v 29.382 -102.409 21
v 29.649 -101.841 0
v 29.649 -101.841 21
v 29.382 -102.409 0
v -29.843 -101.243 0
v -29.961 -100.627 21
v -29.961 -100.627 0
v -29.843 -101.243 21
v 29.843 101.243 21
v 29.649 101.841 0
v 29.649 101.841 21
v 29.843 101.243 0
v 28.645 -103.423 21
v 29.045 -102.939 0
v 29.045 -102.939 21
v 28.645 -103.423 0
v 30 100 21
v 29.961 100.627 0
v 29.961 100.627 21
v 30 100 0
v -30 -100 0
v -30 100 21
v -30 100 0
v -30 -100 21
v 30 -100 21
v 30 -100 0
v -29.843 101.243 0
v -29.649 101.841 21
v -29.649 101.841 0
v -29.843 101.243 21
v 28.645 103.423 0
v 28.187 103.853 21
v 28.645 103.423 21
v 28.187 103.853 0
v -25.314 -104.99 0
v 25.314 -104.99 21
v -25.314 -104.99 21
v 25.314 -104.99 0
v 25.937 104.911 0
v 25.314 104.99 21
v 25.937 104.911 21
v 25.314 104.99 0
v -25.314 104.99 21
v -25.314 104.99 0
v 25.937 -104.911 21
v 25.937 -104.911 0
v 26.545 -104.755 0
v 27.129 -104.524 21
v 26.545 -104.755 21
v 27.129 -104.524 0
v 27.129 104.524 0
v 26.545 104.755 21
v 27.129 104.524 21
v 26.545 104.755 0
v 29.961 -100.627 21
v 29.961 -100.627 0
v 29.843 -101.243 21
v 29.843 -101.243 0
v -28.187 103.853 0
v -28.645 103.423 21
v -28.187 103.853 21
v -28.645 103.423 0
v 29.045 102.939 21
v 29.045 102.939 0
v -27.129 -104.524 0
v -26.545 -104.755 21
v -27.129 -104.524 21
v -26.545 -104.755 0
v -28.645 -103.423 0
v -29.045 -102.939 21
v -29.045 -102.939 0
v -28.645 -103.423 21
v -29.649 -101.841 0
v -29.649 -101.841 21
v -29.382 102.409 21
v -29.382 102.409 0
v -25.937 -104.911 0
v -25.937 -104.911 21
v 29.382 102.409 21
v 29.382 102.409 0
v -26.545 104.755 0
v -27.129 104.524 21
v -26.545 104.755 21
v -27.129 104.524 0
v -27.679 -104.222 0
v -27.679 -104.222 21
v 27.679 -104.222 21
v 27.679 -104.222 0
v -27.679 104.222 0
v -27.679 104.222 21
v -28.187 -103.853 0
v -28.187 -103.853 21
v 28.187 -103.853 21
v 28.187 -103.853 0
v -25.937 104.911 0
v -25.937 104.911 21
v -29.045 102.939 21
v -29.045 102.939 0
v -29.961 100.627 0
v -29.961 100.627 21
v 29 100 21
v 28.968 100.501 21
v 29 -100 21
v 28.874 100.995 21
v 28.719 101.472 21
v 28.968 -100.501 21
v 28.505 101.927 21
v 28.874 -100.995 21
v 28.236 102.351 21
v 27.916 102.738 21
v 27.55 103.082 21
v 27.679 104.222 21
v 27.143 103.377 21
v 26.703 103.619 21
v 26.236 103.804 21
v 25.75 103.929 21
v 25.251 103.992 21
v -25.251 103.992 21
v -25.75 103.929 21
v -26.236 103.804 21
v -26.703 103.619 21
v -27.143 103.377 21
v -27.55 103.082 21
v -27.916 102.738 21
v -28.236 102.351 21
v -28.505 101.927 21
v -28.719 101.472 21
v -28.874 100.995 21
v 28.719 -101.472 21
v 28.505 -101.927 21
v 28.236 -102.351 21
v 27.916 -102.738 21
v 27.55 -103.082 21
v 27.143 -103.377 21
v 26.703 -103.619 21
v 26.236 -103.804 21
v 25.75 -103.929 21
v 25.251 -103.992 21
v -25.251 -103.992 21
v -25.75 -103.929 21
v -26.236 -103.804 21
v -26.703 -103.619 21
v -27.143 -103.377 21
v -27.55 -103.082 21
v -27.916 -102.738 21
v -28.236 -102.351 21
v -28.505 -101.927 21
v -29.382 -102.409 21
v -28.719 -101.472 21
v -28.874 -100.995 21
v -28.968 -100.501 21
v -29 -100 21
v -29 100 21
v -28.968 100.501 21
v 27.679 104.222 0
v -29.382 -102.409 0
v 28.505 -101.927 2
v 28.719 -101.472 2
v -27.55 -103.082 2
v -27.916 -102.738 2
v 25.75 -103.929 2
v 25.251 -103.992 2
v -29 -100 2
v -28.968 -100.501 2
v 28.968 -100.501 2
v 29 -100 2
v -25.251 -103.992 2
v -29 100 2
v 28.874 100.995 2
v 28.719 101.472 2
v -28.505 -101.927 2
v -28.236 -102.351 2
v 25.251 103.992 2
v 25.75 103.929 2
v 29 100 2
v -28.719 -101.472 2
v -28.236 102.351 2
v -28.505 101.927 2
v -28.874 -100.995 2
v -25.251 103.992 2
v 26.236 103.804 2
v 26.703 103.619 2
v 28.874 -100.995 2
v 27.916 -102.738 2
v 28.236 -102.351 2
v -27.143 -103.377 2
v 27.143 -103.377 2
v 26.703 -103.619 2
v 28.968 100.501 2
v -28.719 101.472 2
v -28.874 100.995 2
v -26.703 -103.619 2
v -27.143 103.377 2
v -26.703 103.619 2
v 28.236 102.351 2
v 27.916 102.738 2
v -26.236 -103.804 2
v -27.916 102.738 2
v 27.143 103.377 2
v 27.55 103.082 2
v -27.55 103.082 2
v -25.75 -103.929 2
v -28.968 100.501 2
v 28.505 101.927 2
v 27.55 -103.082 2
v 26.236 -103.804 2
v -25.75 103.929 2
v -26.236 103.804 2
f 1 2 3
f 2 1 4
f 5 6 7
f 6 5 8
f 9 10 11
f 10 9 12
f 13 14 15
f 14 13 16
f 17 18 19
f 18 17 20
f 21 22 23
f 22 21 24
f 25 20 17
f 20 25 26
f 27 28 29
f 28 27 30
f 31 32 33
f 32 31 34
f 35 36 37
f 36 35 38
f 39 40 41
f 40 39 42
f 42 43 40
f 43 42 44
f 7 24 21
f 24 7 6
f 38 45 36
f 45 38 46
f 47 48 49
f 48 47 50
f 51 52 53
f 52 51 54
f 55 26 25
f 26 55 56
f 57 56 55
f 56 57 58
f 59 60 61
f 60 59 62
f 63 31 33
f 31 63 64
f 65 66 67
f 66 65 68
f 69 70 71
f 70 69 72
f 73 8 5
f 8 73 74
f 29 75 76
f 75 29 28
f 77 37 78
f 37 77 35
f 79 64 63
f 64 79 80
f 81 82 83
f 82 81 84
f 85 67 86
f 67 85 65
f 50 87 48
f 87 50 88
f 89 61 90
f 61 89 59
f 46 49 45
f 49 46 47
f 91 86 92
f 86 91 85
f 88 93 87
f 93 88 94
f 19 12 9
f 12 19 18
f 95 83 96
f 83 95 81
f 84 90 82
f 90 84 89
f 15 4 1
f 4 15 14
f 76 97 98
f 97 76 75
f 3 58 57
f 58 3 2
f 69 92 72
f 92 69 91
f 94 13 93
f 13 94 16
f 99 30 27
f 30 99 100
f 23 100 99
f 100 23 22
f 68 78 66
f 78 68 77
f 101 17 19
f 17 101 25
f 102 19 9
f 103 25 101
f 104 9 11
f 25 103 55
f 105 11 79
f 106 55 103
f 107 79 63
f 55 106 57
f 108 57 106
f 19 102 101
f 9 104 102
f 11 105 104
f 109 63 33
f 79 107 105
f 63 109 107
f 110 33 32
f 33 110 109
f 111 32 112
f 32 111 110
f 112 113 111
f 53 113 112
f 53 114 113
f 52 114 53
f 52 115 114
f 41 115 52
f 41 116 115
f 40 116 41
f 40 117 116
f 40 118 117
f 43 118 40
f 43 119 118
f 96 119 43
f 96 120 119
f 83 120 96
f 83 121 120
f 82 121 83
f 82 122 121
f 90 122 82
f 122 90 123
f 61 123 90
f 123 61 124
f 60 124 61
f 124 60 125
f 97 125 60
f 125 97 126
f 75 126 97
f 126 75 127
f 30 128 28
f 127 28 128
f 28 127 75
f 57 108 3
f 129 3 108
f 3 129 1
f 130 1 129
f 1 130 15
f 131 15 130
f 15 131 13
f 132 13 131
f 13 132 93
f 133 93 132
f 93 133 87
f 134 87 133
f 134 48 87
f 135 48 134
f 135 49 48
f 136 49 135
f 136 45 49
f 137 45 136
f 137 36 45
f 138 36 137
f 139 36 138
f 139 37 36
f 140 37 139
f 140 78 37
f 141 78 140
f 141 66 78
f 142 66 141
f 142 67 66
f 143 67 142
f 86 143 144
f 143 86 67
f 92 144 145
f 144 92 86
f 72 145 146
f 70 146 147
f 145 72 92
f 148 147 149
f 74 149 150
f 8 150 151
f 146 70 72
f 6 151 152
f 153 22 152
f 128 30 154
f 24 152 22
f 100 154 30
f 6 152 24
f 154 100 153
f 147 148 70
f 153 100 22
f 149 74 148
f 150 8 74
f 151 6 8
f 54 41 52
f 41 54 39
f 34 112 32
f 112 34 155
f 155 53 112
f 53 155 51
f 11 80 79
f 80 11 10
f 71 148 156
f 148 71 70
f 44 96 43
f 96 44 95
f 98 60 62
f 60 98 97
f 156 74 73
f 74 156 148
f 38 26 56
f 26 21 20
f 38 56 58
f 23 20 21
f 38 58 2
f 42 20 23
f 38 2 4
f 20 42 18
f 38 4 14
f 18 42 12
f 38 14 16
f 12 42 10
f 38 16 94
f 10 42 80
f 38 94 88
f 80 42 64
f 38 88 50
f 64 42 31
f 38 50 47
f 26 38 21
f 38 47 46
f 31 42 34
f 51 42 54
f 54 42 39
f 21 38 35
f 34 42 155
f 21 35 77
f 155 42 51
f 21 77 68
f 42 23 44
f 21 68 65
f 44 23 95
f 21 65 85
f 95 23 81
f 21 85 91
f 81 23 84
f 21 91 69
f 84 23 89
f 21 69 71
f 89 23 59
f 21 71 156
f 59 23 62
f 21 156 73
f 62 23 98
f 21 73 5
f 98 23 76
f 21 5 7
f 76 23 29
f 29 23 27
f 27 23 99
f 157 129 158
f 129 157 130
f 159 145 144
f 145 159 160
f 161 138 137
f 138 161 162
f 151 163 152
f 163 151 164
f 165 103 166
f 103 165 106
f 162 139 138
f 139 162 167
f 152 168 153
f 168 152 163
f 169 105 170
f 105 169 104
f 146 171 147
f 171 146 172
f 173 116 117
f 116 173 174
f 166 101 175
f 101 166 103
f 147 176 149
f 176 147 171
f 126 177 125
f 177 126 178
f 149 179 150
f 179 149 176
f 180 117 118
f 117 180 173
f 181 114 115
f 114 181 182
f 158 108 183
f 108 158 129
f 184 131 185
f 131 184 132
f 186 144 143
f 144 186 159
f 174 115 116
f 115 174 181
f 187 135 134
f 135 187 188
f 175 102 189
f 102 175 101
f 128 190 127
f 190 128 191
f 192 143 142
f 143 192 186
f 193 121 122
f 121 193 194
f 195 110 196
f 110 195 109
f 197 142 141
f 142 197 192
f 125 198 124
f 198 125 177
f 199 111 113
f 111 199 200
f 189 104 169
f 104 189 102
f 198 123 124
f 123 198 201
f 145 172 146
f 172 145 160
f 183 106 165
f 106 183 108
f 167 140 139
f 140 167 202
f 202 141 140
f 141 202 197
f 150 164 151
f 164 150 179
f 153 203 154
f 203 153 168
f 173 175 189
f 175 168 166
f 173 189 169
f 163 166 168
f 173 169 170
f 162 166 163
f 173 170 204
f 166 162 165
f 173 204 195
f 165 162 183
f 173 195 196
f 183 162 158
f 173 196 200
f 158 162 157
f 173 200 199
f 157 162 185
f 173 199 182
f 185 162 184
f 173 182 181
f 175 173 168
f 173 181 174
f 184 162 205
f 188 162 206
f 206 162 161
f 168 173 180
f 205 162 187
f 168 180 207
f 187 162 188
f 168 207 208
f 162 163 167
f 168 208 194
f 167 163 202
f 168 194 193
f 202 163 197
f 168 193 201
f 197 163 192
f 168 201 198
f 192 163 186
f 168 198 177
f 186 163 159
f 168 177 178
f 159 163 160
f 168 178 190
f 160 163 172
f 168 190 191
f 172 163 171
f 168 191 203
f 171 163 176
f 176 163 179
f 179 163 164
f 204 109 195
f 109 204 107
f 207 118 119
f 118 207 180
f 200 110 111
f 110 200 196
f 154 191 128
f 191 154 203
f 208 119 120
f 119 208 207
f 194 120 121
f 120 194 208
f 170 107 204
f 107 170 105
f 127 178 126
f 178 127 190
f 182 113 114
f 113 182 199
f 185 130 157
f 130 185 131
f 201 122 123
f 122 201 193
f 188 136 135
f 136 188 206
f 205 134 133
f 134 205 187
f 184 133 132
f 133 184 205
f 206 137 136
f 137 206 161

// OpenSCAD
$fn = 50;


difference() {
	union() {
		hull() {
			translate(v = [-25.0000000000, 100.0000000000, 0]) {
				cylinder(h = 21, r = 5);
			}
			translate(v = [25.0000000000, 100.0000000000, 0]) {
				cylinder(h = 21, r = 5);
			}
			translate(v = [-25.0000000000, -100.0000000000, 0]) {
				cylinder(h = 21, r = 5);
			}
			translate(v = [25.0000000000, -100.0000000000, 0]) {
				cylinder(h = 21, r = 5);
			}
		}
	}
	union() {
		translate(v = [0, 0, 2]) {
			hull() {
				translate(v = [-25.0000000000, 100.0000000000, 0]) {
					cylinder(h = 19, r = 4);
				}
				translate(v = [25.0000000000, 100.0000000000, 0]) {
					cylinder(h = 19, r = 4);
				}
				translate(v = [-25.0000000000, -100.0000000000, 0]) {
					cylinder(h = 19, r = 4);
				}
				translate(v = [25.0000000000, -100.0000000000, 0]) {
					cylinder(h = 19, r = 4);
				}
			}
		}
	}
}
